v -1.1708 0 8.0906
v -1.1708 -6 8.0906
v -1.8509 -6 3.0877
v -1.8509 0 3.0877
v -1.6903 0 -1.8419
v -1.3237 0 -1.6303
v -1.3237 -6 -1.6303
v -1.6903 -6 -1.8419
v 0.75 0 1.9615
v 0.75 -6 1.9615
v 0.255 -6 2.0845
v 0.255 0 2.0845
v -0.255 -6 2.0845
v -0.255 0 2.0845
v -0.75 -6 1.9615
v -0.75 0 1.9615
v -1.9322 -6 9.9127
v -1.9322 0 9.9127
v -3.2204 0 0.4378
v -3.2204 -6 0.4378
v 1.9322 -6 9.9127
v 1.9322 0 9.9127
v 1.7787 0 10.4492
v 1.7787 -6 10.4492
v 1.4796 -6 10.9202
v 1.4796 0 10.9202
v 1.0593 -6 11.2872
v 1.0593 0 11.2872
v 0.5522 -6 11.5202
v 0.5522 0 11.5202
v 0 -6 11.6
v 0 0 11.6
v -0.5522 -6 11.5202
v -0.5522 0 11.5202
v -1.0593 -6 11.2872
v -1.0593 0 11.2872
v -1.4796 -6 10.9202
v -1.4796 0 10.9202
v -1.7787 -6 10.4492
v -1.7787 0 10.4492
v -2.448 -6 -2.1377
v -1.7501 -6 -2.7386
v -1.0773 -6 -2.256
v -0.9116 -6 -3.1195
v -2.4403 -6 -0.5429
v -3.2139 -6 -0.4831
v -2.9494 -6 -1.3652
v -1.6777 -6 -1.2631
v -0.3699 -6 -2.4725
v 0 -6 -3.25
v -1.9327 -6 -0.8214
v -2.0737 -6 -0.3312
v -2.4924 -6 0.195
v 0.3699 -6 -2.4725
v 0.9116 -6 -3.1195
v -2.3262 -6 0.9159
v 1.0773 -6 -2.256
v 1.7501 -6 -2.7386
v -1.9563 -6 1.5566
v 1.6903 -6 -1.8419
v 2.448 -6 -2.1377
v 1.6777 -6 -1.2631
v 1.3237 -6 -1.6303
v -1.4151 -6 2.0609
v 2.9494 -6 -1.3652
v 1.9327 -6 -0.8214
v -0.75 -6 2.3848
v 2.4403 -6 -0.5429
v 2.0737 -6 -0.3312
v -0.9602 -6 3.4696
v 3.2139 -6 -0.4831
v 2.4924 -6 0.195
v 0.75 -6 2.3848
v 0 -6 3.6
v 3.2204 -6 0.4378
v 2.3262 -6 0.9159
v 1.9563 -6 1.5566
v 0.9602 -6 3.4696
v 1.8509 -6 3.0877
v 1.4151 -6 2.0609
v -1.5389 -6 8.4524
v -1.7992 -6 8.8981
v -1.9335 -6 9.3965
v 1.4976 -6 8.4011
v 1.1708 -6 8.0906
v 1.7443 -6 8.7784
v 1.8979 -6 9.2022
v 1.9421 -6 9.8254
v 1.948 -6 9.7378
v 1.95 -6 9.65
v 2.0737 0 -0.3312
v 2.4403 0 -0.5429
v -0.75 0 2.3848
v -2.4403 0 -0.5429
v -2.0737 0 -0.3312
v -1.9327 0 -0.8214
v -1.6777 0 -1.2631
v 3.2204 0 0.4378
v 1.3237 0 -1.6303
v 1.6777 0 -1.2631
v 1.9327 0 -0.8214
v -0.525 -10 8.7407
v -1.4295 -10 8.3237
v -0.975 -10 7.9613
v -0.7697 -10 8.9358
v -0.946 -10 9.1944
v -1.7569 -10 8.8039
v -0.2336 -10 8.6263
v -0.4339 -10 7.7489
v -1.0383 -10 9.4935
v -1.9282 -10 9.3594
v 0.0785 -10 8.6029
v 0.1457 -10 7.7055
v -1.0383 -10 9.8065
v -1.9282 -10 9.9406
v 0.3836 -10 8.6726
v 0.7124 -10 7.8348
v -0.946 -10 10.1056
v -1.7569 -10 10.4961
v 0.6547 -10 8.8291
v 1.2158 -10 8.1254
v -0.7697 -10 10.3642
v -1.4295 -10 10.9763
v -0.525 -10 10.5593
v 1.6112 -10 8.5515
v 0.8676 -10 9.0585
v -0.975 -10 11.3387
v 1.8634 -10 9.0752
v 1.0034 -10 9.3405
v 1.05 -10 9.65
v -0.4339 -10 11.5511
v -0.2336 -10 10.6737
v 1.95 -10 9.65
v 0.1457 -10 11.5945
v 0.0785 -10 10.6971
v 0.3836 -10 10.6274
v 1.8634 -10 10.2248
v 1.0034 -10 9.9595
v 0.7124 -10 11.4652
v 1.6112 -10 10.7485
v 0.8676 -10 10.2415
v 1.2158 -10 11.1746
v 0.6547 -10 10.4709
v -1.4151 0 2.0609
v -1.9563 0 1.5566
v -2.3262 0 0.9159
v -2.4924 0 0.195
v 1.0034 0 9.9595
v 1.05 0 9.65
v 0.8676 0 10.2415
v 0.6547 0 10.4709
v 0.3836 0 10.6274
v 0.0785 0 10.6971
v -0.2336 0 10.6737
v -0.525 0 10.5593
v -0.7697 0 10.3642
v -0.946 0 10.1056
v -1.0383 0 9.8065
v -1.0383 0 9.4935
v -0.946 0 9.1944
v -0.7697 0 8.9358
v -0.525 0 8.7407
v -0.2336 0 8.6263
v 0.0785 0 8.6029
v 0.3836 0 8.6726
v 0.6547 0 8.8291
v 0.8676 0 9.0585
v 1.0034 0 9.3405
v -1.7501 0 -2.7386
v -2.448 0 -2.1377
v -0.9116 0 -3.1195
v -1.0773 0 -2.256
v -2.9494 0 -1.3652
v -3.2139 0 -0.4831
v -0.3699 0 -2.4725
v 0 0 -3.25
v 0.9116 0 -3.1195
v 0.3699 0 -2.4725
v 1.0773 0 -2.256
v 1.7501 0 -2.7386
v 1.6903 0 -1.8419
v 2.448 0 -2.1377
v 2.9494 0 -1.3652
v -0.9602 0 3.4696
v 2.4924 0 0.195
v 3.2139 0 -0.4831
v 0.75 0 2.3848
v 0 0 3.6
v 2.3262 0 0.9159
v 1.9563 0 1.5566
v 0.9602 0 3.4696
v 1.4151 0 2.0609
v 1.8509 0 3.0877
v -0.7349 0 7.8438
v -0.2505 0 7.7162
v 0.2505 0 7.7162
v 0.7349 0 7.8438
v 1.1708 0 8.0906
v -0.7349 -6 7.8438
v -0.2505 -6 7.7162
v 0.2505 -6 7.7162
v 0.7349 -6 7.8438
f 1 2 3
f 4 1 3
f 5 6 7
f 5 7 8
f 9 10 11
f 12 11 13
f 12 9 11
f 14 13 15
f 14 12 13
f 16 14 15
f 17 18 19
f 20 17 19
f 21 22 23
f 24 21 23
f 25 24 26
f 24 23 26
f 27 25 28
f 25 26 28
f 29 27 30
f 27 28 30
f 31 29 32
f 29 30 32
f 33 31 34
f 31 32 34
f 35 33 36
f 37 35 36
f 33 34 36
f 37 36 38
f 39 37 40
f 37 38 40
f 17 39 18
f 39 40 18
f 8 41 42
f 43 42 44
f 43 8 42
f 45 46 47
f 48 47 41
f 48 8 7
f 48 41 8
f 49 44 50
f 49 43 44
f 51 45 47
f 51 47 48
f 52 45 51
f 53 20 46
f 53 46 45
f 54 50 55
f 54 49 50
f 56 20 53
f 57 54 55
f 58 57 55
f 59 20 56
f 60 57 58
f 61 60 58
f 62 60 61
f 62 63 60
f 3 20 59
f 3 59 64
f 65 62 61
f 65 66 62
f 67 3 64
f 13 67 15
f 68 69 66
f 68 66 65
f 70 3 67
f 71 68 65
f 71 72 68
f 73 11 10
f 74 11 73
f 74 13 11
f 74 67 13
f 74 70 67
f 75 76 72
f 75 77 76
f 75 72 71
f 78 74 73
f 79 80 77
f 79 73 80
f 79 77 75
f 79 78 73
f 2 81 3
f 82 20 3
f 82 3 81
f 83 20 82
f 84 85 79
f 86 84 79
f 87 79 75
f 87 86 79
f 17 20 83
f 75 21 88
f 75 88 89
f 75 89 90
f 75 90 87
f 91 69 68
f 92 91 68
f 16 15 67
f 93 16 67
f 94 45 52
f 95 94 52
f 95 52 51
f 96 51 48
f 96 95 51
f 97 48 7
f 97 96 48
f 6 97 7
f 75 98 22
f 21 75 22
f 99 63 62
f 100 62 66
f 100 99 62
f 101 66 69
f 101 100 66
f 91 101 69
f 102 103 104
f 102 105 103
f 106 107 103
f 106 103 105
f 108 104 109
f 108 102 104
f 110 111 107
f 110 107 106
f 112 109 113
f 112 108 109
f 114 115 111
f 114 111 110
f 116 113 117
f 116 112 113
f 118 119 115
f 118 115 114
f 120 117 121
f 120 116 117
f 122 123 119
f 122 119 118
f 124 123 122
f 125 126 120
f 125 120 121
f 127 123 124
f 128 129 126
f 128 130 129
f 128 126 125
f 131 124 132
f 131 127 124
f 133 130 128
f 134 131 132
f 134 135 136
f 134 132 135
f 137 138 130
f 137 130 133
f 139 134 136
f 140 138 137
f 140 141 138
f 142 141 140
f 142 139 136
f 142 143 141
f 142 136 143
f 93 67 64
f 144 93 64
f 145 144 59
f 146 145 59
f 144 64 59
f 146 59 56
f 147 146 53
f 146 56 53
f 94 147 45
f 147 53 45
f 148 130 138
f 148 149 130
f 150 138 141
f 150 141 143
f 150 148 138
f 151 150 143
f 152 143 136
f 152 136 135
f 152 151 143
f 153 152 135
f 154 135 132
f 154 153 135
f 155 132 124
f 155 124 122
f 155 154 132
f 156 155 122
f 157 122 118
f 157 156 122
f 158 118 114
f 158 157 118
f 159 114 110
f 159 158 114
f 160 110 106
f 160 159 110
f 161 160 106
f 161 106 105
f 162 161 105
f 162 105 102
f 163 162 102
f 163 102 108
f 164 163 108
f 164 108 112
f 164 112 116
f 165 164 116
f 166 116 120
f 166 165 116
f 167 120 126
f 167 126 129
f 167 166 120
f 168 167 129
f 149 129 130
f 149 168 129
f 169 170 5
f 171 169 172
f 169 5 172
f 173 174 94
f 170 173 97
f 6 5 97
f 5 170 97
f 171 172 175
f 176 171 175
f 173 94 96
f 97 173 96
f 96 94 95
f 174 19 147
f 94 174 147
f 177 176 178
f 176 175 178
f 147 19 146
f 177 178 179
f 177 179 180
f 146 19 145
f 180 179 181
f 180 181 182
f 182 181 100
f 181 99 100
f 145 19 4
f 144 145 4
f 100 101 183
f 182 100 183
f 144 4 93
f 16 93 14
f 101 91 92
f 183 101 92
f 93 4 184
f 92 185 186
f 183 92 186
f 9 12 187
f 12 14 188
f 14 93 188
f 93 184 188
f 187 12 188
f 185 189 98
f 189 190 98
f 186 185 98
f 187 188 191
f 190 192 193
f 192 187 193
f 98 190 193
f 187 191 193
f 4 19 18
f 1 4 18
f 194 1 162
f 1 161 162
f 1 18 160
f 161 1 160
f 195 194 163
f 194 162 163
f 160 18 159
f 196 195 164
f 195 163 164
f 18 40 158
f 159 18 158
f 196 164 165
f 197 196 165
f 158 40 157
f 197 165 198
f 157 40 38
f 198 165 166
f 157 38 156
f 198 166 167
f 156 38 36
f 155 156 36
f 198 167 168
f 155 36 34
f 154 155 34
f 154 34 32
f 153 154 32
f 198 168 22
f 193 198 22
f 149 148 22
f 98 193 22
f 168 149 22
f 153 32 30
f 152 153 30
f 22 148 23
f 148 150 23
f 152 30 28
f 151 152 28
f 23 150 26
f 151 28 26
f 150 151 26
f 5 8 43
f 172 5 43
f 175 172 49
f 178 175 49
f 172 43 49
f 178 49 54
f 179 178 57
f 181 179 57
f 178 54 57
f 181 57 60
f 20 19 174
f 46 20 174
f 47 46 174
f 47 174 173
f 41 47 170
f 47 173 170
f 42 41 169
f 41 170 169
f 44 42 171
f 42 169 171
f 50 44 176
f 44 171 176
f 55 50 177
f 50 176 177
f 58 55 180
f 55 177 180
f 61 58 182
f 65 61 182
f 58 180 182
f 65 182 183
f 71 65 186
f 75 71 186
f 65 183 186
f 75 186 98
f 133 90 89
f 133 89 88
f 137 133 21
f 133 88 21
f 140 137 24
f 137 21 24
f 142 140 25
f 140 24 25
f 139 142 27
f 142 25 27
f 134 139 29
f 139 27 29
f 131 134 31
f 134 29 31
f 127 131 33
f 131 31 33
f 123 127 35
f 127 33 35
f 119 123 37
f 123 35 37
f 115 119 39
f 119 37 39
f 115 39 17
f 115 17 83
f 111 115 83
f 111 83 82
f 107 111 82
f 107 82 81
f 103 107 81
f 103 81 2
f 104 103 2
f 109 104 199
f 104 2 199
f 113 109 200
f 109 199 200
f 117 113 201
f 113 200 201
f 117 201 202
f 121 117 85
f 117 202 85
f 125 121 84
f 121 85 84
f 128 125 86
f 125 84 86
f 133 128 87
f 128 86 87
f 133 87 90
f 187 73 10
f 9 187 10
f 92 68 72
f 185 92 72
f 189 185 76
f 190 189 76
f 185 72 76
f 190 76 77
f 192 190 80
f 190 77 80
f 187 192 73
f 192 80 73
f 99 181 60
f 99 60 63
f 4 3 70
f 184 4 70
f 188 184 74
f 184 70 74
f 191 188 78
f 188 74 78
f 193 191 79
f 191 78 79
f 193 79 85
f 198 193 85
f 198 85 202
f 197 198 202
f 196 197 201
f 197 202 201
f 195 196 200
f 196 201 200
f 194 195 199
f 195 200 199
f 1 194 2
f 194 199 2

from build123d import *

# Parameters (mm, degrees)
F0_R     = 2.1
F0_R_2   = 1.05
F1_DEPTH = 6
F3_DEPTH = 25
F5_DEPTH = 25
F6_R     = 1.95
F6_R_2   = 1.05
F7_DEPTH = 4


with BuildPart() as f1:
    # F0 (on Front) → F1 (new body)
    with BuildSketch(Plane.XZ):
        with BuildLine():
            Line((-1.9322245482, 9.9126943005), (-3.2203742469, 0.4378238342))
            ThreePointArc((-3.2203742469, 0.4378238342), (0, -3.25), (3.2203742469, 0.4378238342))
            Line((3.2203742469, 0.4378238342), (1.9322245482, 9.9126943005))
            ThreePointArc((1.9322245482, 9.9126943005), (0, 11.6), (-1.9322245482, 9.9126943005))
        make_face()
        Circle(F0_R, mode=Mode.SUBTRACT)
        with Locations((0, 9.65)):
            Circle(F0_R_2, mode=Mode.SUBTRACT)
    extrude(amount=F1_DEPTH)

    # F2 (on face) → F3 (cut)
    with BuildSketch(Plane.XZ.offset(6)):
        with BuildLine():
            ThreePointArc((1.170751587, 8.0905639733), (0, 7.7), (-1.170751587, 8.0905639733))
            Line((-1.170751587, 8.0905639733), (-1.850907083, 3.087740755))
            ThreePointArc((-1.850907083, 3.087740755), (0, 3.6), (1.850907083, 3.087740755))
            Line((1.850907083, 3.087740755), (1.170751587, 8.0905639733))
        make_face()
    extrude(amount=-F3_DEPTH, mode=Mode.SUBTRACT)

    # F4 (on face) → F5 (cut)
    with BuildSketch(Plane.XZ.offset(6)):
        with BuildLine():
            Line((-0.75, 1.9615045246), (-0.75, 2.3848480035))
            ThreePointArc((-0.75, 2.3848480035), (-2.1650635095, 1.25), (-2.4403389552, -0.5429049489))
            Line((-2.4403389552, -0.5429049489), (-2.0737127479, -0.3312332095))
            ThreePointArc((-2.0737127479, -0.3312332095), (-1.8186533479, 1.05), (-0.75, 1.9615045246))
        make_face()
        with BuildLine():
            ThreePointArc((1.3237127479, -1.6302713151), (0, -2.1), (-1.3237127479, -1.6302713151))
            Line((-1.3237127479, -1.6302713151), (-1.6903389552, -1.8419430546))
            ThreePointArc((-1.6903389552, -1.8419430546), (0, -2.5), (1.6903389552, -1.8419430546))
            Line((1.6903389552, -1.8419430546), (1.3237127479, -1.6302713151))
        make_face()
        with BuildLine():
            ThreePointArc((0.75, 1.9615045246), (1.8186533479, 1.05), (2.0737127479, -0.3312332095))
            Line((2.0737127479, -0.3312332095), (2.4403389552, -0.5429049489))
            ThreePointArc((2.4403389552, -0.5429049489), (2.1650635095, 1.25), (0.75, 2.3848480035))
            Line((0.75, 2.3848480035), (0.75, 1.9615045246))
        make_face()
    extrude(amount=-F5_DEPTH, mode=Mode.SUBTRACT)

    # F6 (on face) → F7 (join)
    with BuildSketch(Plane.XZ.offset(6)):
        with Locations((0, 9.65)):
            Circle(F6_R)
        with Locations((0, 9.65)):
            Circle(F6_R_2, mode=Mode.SUBTRACT)
    extrude(amount=F7_DEPTH)


solid = f1.part
